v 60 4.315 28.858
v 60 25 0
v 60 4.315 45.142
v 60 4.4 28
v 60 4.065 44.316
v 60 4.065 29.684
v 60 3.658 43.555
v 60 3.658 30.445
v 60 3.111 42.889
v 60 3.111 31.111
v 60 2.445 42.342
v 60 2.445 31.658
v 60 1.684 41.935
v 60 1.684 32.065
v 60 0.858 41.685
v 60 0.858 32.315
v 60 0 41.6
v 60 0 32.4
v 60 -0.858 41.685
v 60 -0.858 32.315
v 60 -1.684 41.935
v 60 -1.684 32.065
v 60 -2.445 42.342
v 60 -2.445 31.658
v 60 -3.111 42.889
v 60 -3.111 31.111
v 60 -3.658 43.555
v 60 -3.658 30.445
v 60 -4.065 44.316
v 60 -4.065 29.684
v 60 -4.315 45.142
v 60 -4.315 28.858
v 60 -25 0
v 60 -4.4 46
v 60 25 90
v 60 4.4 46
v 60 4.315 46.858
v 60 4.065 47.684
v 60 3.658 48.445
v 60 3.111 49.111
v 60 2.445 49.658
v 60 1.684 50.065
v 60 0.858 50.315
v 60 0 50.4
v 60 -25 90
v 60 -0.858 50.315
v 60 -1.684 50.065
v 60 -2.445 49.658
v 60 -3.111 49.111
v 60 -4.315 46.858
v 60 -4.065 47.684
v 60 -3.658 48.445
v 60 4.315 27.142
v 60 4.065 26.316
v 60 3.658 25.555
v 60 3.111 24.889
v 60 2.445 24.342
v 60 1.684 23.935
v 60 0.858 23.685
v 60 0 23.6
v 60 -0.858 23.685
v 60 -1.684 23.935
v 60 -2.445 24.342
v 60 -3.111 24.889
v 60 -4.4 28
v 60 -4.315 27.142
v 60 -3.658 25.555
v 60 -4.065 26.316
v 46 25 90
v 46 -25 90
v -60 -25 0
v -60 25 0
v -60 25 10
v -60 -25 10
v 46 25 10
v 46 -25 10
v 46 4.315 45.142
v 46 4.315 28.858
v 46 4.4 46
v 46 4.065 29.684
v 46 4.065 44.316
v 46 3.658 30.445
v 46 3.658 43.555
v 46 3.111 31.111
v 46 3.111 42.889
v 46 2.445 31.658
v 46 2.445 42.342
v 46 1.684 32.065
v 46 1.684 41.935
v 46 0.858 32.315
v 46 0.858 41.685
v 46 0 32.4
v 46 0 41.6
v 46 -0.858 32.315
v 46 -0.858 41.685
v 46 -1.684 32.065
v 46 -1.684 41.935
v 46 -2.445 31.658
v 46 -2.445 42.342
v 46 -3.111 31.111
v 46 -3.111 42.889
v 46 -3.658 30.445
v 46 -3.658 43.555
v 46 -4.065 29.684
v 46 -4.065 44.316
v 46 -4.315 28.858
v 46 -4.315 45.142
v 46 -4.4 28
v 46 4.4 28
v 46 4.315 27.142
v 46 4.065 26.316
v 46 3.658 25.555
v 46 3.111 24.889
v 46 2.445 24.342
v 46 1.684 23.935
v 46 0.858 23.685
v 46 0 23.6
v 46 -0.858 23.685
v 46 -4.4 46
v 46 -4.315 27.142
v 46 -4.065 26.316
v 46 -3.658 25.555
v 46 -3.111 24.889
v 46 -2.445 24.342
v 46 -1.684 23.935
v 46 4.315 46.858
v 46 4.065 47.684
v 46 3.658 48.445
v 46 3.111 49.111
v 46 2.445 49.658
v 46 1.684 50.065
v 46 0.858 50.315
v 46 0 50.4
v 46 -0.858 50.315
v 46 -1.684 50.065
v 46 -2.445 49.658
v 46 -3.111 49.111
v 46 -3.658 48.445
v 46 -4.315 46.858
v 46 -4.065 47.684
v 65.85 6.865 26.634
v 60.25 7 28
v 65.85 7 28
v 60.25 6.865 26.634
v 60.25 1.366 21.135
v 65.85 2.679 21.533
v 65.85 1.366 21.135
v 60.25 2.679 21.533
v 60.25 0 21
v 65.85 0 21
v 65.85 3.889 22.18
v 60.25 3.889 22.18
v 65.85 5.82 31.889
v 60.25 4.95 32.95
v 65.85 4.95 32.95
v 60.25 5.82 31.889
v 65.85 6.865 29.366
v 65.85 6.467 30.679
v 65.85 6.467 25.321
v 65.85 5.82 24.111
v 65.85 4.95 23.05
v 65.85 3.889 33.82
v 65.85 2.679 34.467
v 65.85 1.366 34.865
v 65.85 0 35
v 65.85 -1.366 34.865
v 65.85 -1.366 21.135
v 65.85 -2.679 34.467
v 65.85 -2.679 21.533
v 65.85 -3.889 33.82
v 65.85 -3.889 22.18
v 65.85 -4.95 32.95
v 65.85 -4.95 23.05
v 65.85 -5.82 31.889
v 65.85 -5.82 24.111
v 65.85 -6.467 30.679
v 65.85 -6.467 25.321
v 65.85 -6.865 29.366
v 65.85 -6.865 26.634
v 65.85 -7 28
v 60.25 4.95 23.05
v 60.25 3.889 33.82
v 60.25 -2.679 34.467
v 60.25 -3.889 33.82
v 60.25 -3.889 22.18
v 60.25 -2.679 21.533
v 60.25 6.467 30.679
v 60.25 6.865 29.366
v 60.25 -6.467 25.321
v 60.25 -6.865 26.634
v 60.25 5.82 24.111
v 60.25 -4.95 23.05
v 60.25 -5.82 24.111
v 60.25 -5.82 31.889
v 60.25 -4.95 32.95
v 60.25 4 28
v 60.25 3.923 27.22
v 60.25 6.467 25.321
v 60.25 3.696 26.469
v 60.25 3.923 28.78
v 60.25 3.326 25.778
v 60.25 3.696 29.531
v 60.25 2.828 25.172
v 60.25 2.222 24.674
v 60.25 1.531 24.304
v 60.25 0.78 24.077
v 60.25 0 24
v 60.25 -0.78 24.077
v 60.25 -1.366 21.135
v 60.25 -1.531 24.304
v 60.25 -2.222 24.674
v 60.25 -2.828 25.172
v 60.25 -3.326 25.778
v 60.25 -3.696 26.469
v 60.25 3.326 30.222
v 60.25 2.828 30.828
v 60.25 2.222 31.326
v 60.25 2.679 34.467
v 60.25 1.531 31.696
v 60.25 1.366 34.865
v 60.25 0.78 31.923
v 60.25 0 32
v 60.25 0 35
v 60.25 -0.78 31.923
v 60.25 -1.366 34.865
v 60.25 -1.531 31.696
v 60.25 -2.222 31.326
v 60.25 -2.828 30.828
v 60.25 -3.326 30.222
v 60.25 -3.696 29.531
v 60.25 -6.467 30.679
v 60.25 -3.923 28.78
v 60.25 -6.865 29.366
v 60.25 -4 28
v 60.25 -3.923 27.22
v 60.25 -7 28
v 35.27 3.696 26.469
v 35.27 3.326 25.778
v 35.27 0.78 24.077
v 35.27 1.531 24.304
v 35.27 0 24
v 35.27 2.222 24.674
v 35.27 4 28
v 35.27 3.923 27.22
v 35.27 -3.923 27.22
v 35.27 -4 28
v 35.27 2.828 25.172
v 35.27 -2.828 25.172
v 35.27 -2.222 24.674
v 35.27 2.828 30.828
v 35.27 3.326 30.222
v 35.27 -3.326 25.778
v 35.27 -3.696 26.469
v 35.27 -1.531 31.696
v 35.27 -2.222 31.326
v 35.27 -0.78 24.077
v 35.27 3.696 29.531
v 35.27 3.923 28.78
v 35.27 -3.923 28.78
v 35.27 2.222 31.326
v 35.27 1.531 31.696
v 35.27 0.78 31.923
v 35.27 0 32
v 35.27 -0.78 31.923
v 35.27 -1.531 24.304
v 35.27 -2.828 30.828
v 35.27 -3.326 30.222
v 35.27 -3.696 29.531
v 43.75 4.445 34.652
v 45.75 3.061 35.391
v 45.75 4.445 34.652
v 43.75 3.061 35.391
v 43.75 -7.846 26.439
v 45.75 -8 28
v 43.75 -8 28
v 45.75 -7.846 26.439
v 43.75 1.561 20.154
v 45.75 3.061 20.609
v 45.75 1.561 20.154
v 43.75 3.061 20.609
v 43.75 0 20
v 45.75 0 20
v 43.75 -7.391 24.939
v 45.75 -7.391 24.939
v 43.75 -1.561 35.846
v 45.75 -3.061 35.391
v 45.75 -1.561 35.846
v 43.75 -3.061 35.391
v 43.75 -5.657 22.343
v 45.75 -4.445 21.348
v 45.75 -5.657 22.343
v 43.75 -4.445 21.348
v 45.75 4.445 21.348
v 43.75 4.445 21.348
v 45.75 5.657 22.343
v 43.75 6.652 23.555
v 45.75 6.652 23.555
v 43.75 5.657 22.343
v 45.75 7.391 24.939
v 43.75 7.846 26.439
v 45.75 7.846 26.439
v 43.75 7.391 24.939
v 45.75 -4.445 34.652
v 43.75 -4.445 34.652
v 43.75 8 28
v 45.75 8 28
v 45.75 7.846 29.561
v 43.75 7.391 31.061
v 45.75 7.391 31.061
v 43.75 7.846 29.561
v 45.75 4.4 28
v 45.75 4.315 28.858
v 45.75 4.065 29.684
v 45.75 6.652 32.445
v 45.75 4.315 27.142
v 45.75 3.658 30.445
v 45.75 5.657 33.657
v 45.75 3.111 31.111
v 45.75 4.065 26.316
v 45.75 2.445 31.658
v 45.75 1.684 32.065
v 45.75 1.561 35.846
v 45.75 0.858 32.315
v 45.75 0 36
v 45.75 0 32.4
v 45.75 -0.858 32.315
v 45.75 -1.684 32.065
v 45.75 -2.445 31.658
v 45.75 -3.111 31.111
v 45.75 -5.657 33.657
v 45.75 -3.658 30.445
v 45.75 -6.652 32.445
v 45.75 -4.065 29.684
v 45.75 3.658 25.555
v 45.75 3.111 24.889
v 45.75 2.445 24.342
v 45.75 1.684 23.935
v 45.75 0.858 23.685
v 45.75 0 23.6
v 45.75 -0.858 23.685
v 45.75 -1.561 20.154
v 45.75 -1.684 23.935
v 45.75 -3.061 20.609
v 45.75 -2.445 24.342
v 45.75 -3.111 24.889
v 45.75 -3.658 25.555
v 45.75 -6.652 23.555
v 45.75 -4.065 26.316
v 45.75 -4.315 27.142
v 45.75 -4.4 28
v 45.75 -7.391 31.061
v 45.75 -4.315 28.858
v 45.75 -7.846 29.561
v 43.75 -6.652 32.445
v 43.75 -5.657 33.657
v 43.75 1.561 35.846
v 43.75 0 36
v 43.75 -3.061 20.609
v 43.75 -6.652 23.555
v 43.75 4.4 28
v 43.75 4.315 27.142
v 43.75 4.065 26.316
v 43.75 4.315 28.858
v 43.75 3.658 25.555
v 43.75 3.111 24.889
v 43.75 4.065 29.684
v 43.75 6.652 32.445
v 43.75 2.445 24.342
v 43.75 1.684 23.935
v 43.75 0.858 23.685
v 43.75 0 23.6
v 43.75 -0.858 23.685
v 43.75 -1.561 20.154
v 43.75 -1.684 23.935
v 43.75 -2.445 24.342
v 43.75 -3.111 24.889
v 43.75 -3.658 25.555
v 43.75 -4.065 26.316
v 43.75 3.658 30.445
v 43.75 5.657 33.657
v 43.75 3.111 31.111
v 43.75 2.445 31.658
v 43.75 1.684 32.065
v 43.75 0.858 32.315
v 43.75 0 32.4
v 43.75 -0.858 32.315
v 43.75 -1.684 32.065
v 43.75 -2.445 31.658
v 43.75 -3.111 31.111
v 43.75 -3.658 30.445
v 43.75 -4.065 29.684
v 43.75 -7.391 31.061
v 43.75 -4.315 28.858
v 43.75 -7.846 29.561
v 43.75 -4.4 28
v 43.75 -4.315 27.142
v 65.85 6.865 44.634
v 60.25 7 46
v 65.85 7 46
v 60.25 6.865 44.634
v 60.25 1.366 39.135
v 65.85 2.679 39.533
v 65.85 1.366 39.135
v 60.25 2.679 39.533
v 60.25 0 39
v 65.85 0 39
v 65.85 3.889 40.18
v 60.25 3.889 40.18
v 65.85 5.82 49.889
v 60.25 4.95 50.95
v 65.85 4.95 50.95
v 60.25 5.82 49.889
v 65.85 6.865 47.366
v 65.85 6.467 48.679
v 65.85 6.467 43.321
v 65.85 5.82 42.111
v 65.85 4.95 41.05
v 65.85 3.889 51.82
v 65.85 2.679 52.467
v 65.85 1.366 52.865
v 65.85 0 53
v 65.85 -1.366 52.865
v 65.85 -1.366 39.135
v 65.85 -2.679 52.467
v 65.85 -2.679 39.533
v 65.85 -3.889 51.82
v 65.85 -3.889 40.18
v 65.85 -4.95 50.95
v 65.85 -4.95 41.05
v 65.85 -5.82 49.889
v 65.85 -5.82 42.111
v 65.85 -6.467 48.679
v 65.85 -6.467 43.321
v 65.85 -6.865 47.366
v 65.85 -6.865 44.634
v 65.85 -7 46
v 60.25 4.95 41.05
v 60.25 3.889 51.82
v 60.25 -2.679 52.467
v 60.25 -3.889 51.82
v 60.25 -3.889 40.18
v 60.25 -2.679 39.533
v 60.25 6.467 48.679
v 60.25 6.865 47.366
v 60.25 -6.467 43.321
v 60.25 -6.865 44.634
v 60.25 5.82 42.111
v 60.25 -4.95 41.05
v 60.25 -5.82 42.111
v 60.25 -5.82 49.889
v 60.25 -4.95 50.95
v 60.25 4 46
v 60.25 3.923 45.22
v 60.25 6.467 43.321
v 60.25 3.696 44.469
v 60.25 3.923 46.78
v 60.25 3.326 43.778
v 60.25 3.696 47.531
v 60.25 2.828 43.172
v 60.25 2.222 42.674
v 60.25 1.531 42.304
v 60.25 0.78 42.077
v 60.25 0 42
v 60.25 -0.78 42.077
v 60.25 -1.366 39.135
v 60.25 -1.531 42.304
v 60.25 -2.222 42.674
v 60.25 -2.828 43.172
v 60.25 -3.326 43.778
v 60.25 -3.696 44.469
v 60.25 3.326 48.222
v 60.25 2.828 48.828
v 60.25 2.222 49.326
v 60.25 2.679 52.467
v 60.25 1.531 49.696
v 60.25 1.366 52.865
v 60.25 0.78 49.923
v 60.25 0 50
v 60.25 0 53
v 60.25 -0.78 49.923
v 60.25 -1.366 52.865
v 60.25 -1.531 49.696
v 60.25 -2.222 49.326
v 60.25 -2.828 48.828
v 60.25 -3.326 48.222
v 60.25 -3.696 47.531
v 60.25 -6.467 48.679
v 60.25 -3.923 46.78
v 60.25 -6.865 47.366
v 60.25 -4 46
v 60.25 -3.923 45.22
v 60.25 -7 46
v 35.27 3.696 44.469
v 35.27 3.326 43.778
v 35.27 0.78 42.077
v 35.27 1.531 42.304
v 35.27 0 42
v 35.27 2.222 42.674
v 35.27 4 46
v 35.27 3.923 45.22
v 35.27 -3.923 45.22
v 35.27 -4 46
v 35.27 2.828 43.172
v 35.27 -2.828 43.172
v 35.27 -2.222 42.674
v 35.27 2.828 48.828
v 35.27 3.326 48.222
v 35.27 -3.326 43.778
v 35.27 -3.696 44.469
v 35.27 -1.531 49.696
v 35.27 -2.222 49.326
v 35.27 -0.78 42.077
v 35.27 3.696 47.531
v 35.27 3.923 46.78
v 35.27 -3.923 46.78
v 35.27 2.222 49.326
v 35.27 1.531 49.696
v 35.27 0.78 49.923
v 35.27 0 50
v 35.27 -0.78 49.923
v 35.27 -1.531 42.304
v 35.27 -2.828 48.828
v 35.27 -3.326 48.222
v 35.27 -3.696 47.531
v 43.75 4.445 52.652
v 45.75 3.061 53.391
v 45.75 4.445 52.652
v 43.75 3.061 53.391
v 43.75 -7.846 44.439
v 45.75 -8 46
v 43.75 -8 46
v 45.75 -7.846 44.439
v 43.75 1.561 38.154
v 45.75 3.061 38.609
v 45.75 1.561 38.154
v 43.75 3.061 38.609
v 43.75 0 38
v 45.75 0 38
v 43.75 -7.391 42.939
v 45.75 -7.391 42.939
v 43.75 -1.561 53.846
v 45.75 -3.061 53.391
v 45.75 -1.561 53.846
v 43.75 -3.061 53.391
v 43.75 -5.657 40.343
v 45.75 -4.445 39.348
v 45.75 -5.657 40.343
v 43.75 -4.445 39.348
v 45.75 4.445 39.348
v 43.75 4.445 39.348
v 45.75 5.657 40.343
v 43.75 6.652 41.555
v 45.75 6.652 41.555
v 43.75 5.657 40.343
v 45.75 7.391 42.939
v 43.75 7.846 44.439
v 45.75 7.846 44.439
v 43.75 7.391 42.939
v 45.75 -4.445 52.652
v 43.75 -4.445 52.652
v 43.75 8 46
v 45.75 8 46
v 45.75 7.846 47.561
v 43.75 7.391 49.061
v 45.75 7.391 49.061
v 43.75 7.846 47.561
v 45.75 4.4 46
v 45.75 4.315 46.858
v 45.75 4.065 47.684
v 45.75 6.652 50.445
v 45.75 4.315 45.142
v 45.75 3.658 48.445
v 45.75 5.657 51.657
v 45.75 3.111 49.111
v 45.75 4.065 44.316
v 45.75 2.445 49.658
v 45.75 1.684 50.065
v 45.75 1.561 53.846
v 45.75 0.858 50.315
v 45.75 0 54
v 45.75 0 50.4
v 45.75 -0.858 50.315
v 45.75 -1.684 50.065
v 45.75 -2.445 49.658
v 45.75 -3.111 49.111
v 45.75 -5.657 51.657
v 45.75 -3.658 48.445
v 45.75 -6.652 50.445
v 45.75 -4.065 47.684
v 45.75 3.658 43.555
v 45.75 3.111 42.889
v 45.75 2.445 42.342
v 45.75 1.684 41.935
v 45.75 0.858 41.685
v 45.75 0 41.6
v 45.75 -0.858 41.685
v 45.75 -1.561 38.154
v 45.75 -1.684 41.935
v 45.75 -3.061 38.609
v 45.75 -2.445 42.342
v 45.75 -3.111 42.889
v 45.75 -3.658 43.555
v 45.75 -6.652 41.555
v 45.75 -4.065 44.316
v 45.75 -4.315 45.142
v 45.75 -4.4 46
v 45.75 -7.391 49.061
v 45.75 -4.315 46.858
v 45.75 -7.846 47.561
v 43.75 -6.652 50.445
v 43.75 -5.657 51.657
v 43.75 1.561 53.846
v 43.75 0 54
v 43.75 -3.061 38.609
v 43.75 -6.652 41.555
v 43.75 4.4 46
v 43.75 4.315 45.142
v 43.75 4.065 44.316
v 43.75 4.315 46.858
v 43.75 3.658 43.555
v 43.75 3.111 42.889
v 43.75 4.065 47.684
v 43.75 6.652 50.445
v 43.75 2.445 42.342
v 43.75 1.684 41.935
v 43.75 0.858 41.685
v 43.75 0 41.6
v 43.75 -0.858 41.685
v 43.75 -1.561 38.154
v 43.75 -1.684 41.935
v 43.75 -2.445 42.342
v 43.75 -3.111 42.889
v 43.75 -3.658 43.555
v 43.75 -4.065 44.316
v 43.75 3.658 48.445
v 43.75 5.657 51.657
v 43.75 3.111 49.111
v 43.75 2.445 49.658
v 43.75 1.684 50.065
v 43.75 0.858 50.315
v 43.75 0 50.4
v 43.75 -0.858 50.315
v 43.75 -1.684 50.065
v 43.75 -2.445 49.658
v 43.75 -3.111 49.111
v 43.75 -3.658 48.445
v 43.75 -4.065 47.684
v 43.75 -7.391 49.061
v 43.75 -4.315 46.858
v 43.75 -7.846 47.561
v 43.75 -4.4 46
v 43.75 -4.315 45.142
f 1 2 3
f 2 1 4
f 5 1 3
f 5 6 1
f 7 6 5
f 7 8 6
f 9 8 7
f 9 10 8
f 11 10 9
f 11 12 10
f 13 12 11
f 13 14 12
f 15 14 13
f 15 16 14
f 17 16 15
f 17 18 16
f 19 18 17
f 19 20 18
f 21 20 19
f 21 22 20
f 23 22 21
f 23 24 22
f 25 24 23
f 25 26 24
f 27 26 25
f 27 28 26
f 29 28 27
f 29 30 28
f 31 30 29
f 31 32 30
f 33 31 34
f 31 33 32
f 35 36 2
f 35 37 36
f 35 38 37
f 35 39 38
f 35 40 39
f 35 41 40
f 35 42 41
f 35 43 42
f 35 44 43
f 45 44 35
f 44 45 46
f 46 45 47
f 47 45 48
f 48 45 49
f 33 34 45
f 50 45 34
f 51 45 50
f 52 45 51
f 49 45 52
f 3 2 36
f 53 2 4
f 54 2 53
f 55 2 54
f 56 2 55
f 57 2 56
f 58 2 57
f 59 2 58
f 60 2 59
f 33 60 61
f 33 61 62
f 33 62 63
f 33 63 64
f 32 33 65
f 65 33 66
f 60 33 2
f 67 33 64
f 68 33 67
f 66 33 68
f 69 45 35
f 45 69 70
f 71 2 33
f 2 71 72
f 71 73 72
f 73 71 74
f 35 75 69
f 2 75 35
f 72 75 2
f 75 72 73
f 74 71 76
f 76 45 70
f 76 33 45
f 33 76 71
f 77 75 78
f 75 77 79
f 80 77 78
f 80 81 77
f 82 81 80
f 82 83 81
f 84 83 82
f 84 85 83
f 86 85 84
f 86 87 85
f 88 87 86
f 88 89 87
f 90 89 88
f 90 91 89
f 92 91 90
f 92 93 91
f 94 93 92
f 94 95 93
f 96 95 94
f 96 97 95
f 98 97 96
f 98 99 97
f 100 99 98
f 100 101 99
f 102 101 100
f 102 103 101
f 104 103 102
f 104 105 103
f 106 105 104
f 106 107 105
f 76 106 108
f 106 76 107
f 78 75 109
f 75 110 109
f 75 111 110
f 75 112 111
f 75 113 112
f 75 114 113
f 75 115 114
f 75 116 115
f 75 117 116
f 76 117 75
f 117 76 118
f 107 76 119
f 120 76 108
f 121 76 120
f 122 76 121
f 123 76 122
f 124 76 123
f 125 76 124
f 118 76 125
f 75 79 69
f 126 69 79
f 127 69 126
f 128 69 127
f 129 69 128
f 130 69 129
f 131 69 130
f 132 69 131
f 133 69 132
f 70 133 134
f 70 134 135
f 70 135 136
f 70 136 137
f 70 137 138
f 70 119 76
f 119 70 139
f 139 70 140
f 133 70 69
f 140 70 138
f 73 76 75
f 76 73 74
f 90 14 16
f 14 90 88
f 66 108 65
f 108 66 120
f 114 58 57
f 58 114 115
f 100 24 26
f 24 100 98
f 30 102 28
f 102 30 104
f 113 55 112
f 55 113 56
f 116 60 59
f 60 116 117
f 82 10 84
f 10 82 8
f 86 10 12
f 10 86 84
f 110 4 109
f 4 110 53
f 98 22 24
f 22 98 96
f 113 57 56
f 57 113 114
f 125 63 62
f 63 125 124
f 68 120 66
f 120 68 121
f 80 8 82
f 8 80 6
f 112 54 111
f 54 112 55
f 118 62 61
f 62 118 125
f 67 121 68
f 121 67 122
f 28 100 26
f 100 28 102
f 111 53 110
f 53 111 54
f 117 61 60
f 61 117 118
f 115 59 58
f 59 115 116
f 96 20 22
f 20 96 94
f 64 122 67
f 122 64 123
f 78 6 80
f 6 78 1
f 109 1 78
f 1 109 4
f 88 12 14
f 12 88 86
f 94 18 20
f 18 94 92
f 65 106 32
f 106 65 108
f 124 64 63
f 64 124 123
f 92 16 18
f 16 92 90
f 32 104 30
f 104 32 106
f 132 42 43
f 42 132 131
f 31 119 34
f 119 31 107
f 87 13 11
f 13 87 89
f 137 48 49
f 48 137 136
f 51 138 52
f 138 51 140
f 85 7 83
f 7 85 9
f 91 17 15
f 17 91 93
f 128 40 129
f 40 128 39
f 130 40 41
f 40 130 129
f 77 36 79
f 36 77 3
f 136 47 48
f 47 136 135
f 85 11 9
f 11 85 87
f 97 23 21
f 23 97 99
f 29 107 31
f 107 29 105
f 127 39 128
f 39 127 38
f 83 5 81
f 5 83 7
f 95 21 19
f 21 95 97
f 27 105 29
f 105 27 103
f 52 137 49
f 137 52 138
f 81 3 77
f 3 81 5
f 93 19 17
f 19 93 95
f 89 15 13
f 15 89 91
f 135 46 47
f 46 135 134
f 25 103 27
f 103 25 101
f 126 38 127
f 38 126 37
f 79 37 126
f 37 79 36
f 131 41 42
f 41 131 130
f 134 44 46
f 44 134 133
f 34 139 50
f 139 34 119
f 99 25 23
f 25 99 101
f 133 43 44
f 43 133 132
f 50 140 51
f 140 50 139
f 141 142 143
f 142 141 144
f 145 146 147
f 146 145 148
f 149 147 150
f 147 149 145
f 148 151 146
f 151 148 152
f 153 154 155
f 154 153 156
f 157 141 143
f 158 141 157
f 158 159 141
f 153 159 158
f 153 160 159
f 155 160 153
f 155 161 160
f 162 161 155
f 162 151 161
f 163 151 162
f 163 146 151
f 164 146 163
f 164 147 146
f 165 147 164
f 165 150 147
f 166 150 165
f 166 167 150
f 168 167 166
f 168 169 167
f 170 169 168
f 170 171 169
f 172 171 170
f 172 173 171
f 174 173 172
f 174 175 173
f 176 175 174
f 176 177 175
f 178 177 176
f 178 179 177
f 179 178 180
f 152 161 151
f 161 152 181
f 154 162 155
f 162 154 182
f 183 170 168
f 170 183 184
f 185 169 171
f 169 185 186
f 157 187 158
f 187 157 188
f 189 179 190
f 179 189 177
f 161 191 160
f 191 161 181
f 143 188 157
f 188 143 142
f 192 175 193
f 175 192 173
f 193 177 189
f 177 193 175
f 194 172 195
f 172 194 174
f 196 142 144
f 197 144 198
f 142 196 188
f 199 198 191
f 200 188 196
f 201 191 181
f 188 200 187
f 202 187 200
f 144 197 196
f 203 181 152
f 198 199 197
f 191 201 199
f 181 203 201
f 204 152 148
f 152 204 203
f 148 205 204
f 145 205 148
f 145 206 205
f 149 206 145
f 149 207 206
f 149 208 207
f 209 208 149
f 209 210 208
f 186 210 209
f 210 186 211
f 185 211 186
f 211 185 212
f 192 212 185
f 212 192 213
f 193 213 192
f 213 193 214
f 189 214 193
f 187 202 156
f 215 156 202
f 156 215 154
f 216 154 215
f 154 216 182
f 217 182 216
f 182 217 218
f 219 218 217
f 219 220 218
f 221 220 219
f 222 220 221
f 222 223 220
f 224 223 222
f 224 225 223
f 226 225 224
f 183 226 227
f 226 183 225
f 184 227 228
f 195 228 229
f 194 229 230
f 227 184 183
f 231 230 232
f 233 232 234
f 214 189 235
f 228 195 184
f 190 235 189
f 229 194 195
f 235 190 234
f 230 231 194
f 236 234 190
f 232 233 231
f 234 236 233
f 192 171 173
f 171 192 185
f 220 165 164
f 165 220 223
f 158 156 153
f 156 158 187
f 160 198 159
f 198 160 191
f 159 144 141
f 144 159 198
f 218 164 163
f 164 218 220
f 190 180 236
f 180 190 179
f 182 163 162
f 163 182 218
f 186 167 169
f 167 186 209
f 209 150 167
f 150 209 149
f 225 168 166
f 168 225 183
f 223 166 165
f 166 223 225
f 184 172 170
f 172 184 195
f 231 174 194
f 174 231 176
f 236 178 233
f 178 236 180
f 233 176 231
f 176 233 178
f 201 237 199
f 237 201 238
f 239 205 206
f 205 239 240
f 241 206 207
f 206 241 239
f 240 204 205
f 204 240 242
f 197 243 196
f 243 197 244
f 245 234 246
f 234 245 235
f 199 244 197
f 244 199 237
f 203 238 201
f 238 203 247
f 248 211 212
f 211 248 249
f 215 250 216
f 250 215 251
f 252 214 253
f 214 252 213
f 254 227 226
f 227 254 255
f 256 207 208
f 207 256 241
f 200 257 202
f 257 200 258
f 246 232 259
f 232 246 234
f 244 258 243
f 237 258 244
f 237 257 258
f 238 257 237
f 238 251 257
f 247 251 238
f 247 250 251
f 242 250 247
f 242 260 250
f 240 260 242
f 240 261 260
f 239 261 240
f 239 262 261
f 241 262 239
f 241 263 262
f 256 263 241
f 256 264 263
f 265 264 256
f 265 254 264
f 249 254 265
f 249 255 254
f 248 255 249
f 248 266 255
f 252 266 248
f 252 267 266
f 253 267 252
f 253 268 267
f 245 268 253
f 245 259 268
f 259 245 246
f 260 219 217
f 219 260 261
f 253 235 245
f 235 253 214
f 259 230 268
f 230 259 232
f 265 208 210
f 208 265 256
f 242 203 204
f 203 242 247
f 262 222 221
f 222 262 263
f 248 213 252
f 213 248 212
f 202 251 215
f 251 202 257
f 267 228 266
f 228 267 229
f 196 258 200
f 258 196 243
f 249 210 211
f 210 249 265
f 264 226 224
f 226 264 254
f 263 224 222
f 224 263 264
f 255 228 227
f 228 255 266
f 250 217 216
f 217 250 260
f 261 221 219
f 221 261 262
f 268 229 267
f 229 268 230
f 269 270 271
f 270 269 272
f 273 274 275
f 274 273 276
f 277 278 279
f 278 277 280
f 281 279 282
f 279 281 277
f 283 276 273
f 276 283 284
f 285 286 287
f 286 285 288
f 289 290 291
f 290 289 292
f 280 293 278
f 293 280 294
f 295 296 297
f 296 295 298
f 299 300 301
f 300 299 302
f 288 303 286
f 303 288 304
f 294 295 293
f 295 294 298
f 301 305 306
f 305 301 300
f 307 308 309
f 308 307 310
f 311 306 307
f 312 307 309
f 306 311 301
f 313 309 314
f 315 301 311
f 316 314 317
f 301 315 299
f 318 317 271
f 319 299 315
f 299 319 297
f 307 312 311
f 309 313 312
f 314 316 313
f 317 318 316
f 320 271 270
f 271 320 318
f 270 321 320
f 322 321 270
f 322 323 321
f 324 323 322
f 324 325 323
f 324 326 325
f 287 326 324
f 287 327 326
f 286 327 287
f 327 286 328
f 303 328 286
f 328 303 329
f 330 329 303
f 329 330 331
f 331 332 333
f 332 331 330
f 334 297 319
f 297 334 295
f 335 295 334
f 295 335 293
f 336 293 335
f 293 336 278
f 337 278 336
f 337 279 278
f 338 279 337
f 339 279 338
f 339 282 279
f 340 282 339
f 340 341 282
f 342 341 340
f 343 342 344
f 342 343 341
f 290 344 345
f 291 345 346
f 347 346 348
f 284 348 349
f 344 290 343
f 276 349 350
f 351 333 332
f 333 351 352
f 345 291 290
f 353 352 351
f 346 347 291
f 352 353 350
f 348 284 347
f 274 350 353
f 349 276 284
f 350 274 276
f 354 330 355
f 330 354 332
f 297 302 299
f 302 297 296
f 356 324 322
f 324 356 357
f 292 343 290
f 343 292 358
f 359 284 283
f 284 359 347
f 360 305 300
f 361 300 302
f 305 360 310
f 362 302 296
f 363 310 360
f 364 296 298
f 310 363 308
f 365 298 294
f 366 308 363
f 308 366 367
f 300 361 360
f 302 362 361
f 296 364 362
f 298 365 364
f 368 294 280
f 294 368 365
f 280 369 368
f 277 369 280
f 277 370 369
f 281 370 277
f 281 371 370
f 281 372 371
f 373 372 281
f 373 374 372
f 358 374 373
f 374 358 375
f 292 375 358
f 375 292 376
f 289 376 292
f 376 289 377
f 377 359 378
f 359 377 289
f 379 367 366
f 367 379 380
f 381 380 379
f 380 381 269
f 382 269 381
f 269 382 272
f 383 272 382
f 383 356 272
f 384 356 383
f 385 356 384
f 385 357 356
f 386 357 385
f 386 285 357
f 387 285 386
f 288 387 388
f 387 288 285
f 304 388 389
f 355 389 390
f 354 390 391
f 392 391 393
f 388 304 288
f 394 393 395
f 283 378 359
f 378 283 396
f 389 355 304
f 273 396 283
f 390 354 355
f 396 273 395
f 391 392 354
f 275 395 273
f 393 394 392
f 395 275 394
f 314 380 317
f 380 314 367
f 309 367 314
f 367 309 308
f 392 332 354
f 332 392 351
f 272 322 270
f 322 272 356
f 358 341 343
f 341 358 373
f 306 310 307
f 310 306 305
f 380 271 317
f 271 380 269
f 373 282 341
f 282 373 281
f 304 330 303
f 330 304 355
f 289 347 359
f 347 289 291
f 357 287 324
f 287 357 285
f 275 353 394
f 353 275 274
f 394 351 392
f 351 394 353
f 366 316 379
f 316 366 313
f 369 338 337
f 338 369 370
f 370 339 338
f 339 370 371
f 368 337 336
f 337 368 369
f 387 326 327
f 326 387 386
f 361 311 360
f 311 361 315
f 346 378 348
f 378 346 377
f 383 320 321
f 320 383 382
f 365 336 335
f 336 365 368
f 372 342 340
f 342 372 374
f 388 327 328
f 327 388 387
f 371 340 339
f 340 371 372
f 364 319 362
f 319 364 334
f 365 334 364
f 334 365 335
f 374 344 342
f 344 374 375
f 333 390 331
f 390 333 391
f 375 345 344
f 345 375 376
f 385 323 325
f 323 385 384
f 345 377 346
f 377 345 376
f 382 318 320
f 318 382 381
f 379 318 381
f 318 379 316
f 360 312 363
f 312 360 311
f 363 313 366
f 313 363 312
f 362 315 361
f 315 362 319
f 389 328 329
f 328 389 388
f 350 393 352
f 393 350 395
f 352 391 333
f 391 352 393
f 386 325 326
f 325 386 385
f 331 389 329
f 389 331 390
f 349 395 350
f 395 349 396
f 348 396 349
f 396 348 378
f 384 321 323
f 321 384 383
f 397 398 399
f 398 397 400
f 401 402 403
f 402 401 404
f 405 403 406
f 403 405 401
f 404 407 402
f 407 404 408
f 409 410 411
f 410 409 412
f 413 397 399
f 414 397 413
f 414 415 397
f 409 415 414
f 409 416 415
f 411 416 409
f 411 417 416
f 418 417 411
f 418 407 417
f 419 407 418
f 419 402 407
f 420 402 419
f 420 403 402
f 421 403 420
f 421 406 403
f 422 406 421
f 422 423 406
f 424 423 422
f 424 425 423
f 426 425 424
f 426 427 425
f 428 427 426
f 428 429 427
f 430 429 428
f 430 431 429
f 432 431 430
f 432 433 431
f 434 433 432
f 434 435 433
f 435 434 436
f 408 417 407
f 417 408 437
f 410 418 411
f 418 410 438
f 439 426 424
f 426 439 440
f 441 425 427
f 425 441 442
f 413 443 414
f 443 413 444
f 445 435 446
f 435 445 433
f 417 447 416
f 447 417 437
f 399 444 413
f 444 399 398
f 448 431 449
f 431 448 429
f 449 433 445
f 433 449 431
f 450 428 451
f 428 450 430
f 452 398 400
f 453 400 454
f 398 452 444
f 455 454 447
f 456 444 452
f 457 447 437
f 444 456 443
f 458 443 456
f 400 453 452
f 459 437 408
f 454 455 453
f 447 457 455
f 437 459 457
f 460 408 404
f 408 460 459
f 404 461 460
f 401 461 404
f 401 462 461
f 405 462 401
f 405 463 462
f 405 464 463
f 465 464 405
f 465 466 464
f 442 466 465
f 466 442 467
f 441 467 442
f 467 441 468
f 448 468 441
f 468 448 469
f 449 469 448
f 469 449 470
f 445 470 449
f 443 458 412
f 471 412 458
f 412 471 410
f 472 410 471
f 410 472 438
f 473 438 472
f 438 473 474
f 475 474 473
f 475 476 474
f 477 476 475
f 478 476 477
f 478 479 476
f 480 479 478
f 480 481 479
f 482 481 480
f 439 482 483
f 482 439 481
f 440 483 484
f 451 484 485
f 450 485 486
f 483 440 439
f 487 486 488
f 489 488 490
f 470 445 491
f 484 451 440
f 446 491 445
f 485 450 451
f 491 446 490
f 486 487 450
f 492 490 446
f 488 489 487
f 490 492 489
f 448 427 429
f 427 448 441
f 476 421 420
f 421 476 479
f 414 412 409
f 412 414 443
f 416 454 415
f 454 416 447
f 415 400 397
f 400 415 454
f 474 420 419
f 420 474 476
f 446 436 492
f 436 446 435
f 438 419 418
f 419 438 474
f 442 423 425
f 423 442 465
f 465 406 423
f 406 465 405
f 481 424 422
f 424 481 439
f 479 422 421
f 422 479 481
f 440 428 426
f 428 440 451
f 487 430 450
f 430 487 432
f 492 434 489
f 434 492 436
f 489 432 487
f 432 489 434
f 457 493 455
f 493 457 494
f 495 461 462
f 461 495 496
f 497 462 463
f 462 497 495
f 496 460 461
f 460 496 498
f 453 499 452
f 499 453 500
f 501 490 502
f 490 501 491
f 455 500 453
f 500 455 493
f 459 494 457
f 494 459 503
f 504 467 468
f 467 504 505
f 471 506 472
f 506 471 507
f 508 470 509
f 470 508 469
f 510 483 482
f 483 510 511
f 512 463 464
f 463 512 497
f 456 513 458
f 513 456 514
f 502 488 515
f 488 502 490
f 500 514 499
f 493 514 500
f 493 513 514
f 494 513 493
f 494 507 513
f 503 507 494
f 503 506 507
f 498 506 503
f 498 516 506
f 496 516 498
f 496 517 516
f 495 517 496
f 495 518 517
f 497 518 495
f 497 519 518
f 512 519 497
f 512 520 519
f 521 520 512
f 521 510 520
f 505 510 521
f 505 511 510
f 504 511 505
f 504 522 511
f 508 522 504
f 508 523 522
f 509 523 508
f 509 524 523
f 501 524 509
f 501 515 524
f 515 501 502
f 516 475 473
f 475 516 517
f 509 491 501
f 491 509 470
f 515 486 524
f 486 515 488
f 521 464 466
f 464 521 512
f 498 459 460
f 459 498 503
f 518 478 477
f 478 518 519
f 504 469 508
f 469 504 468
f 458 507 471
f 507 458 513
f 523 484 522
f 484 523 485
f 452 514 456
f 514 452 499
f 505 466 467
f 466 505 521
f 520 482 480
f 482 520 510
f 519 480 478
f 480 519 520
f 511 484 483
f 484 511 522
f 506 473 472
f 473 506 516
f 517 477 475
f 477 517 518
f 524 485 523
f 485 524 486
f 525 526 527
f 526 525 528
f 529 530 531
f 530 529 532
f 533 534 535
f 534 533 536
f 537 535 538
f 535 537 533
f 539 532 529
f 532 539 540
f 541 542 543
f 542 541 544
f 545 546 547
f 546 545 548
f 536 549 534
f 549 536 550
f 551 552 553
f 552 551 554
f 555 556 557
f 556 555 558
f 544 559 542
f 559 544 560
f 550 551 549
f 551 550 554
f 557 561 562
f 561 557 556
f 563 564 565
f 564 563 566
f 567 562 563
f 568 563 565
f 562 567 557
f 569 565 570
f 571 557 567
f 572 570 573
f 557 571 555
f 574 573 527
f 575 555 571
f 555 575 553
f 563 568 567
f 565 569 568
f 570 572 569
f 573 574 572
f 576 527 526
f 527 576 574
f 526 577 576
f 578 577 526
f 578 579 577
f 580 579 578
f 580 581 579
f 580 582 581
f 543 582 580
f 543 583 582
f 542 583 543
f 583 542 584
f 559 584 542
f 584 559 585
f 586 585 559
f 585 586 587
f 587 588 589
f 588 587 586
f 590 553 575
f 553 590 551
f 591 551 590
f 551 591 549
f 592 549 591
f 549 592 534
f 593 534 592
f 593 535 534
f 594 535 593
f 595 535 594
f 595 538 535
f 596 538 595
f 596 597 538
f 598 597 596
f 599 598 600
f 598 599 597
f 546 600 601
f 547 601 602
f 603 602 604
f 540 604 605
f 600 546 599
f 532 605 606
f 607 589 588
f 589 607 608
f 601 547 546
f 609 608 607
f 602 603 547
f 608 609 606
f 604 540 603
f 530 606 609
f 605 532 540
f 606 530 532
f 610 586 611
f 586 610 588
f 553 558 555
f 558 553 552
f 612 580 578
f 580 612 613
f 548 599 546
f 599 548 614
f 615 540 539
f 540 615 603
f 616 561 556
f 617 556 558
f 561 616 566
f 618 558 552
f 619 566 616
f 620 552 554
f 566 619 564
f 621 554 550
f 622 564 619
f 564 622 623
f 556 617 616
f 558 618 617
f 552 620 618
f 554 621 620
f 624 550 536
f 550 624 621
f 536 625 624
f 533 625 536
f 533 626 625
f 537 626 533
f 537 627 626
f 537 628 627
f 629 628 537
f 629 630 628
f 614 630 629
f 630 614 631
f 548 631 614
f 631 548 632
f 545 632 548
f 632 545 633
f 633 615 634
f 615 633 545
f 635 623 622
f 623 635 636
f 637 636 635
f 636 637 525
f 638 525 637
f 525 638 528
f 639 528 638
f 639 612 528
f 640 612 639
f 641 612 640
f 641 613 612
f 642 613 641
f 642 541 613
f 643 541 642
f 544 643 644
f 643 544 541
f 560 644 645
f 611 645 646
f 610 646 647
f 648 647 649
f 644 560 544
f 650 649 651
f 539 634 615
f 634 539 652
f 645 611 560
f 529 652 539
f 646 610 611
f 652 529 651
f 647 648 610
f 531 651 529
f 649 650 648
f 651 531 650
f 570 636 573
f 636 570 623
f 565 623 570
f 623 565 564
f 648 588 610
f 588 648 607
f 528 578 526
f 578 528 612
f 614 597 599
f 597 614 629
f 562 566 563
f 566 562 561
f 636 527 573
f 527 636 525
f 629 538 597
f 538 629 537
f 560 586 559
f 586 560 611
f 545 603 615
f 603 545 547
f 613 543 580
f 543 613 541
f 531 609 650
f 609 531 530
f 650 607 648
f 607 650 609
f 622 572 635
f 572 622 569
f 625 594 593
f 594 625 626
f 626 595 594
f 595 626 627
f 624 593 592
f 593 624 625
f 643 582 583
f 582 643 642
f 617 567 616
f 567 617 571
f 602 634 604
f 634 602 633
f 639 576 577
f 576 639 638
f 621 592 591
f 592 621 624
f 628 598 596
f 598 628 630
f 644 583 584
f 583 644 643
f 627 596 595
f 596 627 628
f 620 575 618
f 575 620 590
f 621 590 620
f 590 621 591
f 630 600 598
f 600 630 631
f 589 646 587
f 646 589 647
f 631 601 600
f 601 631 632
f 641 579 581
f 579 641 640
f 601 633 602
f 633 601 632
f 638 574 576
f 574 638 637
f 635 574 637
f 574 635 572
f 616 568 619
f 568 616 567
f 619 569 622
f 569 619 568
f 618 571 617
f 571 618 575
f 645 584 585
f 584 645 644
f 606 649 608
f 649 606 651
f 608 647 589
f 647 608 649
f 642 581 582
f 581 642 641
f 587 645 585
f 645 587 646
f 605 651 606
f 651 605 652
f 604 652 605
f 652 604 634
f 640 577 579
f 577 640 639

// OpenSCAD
$fn = 32;

// ------------------------------------------------------------------------
// Bolted bracket: 120 x 50 mm bracket with 2 bolt joints
// Every part is its own module, assembly() places them once.
// ------------------------------------------------------------------------

// --- part 1 ---
module bracket() {
  difference() {
    translate([-60, -25, 0]) cube([120, 50, 90]);
    translate([-61, -26, 10]) cube([107, 52, 81]);
    translate([53, 0, 28]) rotate([0, 90, 0]) cylinder(h = 16, d = 8.8, center = true);
    translate([53, 0, 46]) rotate([0, 90, 0]) cylinder(h = 16, d = 8.8, center = true);
  }
}

// --- part 2 ---
module bolt1() {
  cylinder(h = 5.6, d = 14);
  translate([0, 0, -24.98]) cylinder(h = 24.98, d = 8);
}

// --- part 3 ---
module washer1() {
  difference() {
      translate([0, 0, 0]) cylinder(h = 2, d = 16);
      translate([0, 0, -1]) cylinder(h = 4, d = 8.8);
    }
}

// --- part 4 ---
module bolt2() {
  cylinder(h = 5.6, d = 14);
  translate([0, 0, -24.98]) cylinder(h = 24.98, d = 8);
}

// --- part 5 ---
module washer2() {
  difference() {
      translate([0, 0, 0]) cylinder(h = 2, d = 16);
      translate([0, 0, -1]) cylinder(h = 4, d = 8.8);
    }
}

// --- assembly ---
module assembly() {
  translate([0, 0, 0]) rotate([0, 0, 0]) bracket();
  translate([60.25, 0, 28]) rotate([0, 90, 0]) bolt1();
  translate([43.75, 0, 28]) rotate([0, 90, 0]) washer1();
  translate([60.25, 0, 46]) rotate([0, 90, 0]) bolt2();
  translate([43.75, 0, 46]) rotate([0, 90, 0]) washer2();
}

assembly();
